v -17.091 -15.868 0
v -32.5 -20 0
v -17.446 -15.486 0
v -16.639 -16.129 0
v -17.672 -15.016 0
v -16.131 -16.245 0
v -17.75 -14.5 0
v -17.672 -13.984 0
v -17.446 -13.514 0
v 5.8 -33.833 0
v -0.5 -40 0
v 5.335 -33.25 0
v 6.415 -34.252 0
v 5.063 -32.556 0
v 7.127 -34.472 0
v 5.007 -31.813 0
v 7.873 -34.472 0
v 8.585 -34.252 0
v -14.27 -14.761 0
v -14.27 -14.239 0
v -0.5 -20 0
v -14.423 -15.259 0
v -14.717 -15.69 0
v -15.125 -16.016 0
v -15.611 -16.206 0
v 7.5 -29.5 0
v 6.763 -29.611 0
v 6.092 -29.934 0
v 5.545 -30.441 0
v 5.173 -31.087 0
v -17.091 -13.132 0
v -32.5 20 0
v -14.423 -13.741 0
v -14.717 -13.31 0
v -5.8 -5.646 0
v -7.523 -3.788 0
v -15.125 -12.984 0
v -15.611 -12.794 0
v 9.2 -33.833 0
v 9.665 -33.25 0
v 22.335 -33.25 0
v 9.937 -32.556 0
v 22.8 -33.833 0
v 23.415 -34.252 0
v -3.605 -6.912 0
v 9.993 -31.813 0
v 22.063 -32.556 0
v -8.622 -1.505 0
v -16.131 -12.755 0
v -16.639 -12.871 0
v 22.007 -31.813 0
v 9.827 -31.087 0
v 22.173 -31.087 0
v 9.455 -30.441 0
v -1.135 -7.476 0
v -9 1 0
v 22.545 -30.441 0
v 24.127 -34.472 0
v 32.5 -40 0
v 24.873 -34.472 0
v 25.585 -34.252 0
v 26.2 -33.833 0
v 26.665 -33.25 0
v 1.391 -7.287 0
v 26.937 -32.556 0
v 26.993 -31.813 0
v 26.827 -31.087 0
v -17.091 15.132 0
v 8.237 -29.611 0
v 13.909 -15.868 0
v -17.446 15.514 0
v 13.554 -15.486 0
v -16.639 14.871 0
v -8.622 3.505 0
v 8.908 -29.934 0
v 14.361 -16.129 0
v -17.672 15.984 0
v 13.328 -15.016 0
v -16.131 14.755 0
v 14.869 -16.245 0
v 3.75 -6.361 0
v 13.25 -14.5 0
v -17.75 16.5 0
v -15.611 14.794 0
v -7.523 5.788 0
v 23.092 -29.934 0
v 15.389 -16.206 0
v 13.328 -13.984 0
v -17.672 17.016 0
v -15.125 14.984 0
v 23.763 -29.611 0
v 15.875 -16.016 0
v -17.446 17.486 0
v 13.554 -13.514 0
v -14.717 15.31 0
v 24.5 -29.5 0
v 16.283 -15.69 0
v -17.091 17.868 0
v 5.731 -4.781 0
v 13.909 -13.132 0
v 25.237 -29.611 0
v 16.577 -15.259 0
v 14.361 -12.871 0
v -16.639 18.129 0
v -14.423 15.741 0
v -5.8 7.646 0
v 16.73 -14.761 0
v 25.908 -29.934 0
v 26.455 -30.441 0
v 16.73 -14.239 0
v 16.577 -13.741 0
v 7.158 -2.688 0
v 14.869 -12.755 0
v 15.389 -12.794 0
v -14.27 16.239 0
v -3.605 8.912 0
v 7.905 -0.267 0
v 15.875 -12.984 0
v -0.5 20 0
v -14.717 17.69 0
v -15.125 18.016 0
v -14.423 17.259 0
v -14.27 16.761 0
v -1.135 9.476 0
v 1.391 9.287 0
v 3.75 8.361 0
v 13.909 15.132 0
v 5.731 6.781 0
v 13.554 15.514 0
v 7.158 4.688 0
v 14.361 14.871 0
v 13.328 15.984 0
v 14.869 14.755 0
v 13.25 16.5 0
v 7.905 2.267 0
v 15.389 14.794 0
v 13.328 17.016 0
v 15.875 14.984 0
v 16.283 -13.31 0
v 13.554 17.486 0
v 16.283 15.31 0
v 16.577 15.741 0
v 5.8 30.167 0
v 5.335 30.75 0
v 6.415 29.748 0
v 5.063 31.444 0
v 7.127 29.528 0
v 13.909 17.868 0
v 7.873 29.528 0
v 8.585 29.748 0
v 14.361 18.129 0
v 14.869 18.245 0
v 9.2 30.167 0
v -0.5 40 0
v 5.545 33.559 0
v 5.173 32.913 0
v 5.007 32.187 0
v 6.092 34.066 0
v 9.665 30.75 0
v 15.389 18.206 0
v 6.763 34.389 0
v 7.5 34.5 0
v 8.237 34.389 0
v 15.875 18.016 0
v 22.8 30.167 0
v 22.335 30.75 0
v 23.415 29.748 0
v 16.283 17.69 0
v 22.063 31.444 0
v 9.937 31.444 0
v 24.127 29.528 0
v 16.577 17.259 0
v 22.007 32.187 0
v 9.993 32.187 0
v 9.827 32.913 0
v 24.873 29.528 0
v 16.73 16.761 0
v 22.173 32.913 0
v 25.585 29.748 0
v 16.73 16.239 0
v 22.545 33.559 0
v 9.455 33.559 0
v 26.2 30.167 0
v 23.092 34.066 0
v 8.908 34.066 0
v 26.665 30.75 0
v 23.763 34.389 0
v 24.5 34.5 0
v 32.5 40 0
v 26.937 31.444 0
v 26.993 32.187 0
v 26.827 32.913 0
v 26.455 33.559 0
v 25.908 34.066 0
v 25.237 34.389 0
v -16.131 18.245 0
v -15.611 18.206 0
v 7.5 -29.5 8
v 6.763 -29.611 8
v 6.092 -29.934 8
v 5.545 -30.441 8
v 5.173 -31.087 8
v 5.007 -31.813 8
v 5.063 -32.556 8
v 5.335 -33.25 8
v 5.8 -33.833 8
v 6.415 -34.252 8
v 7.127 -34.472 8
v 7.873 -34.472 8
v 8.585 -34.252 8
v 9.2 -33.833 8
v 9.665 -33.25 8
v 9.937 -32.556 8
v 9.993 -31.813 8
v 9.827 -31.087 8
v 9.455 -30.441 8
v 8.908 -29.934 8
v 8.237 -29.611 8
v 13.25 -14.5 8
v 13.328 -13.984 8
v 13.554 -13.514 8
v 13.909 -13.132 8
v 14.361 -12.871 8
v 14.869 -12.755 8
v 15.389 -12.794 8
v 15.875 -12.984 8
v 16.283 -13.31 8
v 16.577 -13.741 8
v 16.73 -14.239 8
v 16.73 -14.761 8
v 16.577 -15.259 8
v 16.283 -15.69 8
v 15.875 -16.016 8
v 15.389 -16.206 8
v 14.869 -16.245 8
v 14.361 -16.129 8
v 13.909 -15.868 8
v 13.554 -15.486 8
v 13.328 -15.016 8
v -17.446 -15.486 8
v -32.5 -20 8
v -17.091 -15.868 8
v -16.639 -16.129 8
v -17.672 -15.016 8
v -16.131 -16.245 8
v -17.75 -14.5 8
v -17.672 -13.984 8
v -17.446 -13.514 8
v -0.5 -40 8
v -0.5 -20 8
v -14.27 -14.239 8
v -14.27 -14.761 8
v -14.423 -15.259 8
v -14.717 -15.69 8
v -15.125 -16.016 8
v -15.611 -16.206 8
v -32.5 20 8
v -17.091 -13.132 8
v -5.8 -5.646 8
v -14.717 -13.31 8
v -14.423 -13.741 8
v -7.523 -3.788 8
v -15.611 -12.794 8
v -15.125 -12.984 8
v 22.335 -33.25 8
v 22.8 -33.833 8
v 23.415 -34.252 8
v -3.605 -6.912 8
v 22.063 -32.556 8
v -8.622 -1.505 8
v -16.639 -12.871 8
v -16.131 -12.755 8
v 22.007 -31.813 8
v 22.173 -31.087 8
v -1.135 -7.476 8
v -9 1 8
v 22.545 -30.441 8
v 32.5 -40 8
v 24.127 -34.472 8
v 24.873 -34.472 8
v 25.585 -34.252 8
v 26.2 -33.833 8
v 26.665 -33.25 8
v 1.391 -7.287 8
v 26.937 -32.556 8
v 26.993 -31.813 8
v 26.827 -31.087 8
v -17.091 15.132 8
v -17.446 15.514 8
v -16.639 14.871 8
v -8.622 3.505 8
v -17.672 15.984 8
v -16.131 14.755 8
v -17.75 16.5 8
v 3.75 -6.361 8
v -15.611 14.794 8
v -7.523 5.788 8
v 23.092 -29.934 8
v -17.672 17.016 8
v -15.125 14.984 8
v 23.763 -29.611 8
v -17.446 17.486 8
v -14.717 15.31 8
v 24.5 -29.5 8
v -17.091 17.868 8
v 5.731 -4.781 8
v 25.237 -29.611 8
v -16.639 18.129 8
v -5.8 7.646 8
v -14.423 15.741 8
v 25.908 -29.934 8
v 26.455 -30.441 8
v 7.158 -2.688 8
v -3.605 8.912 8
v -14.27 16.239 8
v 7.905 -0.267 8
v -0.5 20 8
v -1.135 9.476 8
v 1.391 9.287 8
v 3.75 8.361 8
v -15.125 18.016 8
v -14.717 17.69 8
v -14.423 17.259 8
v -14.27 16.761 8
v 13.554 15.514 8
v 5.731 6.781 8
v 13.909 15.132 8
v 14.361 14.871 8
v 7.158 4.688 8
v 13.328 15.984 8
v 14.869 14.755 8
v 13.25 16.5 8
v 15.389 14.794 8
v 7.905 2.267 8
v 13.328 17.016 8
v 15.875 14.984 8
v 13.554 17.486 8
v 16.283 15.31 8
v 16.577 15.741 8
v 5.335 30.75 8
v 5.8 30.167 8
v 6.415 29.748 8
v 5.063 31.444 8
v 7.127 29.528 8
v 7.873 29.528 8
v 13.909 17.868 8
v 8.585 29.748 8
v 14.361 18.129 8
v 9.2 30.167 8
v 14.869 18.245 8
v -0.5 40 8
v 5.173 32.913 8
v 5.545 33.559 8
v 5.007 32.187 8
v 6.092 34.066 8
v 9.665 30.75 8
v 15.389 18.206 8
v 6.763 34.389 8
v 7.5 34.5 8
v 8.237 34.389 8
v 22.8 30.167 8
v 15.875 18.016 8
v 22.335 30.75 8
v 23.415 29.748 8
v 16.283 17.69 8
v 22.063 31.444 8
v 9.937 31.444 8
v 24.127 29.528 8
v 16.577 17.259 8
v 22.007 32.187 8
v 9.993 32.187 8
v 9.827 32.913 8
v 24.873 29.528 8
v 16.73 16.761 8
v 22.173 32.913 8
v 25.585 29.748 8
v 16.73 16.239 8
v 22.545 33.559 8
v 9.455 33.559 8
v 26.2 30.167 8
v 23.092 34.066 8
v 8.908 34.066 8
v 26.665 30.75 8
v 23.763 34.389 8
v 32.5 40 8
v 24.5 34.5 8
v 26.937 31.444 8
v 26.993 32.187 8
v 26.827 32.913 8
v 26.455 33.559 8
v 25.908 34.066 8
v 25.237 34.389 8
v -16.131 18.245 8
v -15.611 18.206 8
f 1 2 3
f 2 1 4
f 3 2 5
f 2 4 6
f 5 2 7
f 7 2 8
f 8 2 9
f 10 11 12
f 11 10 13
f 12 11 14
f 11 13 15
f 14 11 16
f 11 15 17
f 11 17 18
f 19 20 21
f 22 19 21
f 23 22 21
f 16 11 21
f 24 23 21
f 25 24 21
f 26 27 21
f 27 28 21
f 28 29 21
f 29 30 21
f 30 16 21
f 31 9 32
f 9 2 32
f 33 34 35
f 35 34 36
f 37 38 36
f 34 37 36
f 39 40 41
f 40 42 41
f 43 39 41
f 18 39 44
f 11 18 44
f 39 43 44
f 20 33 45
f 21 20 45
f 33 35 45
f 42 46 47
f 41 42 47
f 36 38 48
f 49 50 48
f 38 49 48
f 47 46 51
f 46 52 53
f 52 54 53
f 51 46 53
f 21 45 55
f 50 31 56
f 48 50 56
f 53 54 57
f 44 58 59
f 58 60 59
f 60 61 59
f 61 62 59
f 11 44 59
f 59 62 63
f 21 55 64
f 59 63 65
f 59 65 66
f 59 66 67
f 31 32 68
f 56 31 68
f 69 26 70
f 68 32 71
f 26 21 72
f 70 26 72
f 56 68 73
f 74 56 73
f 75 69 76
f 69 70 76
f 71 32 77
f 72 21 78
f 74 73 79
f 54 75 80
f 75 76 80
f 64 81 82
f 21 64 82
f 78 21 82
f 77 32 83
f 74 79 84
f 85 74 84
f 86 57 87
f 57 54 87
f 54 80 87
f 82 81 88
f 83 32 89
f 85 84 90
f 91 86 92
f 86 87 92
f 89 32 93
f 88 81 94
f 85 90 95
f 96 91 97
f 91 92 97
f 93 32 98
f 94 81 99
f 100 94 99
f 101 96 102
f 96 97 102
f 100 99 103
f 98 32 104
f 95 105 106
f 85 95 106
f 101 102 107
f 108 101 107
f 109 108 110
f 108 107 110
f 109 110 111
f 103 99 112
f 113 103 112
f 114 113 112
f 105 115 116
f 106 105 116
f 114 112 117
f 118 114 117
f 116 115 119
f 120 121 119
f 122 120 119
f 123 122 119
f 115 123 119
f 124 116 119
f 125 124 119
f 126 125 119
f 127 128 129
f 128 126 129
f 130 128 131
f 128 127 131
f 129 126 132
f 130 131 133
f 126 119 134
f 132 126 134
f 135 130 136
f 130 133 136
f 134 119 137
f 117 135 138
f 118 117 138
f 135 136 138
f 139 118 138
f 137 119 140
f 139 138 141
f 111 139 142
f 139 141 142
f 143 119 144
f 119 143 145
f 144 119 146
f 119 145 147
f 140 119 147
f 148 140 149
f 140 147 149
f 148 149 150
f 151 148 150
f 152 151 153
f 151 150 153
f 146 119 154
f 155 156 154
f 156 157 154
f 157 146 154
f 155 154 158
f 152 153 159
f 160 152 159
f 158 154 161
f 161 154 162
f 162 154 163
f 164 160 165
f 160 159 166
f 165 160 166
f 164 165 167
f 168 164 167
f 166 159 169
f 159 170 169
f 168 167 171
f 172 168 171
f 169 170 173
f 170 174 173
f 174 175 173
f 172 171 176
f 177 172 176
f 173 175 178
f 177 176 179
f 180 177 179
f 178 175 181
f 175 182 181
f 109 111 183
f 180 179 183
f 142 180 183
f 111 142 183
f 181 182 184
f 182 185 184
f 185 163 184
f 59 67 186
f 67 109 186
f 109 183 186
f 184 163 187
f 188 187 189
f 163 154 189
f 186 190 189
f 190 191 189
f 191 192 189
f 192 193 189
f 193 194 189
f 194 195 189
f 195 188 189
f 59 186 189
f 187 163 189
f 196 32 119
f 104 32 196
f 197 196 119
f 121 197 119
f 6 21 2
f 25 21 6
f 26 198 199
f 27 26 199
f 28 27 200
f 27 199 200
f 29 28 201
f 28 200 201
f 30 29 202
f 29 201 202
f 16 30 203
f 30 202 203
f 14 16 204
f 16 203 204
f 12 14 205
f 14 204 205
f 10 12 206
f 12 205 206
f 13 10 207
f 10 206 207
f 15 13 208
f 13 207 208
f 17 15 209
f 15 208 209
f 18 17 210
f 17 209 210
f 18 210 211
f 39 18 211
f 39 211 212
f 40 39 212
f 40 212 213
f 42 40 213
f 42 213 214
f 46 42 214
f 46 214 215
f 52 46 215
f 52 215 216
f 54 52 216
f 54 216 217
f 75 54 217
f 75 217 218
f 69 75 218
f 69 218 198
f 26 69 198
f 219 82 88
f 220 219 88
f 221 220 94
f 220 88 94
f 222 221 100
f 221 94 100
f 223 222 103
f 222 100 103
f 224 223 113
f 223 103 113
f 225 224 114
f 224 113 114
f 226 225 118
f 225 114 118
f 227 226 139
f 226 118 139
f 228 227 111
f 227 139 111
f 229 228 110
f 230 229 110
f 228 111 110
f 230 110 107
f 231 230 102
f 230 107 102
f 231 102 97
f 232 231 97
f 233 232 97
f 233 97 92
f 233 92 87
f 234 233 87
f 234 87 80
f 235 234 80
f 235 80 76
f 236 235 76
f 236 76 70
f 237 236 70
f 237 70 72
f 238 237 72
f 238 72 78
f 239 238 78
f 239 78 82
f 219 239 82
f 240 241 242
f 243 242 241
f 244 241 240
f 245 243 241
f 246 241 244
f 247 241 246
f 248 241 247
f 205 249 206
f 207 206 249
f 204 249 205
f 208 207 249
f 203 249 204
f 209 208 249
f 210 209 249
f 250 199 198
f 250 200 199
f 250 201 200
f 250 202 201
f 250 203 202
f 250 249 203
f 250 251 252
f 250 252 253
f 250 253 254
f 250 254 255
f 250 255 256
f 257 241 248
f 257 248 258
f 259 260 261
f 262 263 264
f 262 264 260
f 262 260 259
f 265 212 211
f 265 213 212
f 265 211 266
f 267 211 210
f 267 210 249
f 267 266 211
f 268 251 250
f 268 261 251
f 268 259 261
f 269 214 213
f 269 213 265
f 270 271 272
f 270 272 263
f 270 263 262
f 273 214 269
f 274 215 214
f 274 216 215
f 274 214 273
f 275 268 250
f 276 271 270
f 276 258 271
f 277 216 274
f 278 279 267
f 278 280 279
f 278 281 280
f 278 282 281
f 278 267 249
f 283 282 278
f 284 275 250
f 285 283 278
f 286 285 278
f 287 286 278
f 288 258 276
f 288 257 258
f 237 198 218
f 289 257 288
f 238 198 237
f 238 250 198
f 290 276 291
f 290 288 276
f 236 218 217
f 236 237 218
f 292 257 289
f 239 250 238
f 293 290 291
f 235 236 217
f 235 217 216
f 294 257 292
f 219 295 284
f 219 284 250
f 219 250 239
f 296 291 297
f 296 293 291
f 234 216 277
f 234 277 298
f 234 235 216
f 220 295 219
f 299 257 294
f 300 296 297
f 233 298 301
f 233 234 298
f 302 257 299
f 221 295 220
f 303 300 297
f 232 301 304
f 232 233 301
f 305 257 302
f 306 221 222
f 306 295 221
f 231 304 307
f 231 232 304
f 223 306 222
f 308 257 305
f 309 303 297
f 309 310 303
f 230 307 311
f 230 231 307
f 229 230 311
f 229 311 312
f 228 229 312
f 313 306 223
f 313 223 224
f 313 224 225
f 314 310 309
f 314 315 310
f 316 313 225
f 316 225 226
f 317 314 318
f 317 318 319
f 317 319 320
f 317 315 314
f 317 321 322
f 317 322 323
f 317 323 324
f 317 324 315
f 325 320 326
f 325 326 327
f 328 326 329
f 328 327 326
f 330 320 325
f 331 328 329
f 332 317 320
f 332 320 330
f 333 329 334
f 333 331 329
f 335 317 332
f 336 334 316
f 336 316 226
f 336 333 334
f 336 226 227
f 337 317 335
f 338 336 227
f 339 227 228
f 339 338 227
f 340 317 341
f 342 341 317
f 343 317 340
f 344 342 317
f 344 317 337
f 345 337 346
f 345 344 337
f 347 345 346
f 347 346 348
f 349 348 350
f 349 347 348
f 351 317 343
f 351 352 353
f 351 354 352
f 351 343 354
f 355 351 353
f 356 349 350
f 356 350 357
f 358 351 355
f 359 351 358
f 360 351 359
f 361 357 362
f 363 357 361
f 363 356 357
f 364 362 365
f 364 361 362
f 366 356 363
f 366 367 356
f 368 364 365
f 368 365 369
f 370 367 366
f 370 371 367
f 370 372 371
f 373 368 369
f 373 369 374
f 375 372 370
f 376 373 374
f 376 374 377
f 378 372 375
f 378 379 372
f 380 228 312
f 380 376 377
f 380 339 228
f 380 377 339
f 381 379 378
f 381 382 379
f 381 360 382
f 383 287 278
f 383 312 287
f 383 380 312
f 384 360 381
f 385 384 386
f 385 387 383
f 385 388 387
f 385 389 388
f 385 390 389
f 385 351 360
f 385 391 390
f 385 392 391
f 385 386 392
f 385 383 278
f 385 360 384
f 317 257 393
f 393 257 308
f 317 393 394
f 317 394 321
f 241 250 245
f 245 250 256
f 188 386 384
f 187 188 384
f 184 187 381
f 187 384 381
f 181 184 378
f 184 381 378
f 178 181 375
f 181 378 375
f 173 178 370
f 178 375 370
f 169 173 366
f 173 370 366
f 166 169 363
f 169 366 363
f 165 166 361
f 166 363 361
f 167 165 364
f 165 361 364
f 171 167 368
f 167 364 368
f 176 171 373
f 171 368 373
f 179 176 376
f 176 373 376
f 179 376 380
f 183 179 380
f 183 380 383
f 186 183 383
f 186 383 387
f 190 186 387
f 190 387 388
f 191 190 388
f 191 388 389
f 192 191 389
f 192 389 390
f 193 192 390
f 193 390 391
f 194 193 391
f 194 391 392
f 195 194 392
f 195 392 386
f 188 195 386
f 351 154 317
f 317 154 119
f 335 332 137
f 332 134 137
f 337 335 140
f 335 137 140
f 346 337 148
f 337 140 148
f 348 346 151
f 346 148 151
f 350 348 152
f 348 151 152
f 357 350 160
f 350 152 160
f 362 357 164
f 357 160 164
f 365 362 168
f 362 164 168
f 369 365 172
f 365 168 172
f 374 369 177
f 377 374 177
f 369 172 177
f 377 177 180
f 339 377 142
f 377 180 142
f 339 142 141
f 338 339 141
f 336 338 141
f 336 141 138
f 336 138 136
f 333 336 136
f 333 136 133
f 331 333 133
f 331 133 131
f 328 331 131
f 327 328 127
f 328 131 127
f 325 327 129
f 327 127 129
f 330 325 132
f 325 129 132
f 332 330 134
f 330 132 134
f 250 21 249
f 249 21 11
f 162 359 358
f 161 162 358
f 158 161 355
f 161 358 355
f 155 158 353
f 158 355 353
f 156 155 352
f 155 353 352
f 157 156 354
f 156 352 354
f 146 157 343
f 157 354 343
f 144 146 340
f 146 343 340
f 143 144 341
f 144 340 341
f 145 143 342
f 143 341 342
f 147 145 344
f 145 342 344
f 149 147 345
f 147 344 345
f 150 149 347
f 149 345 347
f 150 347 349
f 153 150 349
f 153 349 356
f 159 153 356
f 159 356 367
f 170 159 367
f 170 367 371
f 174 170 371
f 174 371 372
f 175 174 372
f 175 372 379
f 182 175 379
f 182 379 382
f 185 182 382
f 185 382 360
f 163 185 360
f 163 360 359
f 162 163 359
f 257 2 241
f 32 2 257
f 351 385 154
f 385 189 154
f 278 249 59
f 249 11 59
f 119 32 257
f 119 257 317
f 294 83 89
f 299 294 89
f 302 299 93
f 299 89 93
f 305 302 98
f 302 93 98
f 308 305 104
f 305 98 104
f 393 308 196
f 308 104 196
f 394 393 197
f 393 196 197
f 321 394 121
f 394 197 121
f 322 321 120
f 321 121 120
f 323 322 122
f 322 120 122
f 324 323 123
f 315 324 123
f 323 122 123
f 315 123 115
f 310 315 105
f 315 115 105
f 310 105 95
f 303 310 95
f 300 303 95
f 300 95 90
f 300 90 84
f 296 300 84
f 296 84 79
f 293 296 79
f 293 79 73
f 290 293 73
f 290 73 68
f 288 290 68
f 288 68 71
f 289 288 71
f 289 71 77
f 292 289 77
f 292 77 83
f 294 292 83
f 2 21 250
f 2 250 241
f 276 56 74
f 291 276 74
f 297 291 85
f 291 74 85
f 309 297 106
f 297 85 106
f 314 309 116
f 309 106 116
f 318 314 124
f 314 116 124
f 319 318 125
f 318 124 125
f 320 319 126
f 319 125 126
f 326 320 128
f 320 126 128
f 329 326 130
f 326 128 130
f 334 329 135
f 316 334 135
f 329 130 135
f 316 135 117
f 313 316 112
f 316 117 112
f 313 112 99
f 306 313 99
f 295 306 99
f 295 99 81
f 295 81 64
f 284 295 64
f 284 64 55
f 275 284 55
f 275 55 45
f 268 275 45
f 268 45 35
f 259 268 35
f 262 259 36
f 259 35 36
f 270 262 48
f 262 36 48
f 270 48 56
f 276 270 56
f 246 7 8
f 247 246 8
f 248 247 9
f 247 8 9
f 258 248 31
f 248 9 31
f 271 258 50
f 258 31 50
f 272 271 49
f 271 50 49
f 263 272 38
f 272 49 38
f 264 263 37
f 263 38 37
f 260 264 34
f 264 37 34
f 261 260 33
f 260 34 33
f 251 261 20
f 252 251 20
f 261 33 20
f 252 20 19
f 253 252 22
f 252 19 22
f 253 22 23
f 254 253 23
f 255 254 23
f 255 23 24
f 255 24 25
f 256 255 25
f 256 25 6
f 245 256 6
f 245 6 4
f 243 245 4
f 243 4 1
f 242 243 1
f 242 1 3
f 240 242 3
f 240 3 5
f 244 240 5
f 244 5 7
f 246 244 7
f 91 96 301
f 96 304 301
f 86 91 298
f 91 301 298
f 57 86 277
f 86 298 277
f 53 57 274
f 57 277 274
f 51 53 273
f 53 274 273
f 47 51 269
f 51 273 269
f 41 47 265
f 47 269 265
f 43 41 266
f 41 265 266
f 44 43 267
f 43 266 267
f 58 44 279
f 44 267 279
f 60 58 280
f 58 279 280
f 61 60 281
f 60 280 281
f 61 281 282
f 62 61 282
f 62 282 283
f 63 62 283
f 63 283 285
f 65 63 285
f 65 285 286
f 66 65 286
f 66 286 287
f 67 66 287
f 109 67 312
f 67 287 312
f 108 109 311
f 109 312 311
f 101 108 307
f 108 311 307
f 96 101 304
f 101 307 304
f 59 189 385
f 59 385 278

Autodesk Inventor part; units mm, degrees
ref_plane "YZ Plane" through (0, 0, 0) normal (1, 0, 0) x (0, 1, 0)
ref_plane "XZ Plane" through (0, 0, 0) normal (0, 1, 0) x (-1, 0, 0)
ref_plane "XY Plane" through (0, 0, 0) normal (0, 0, 1) x (1, 0, 0)
sketch "Sketch1" plane through (0, 0, 0) normal (0, 0, 1) x (1, 0, 0)
  line L0 (-32.5, 20) -> (32.5, 20)
  line L1 (32.5, 20) -> (32.5, -20)
  line L2 (32.5, -20) -> (-32.5, -20)
  line L3 (-32.5, -20) -> (-32.5, 20)
  point P0 (0, 0)
  point P1 (0, 20)
  point P2 (-32.5, 0)
  dimension "d0" = 65
  dimension "d1" = 40
extrude "Extrusion1" add sketch "Sketch1" along normal blind 8
sketch "Sketch5" plane through (0, 0, 0) normal (0, 0, -1) x (-1, 0, 0)
  line L0 (-32.5, 40) -> (0.5, 40)
  line L1 (0.5, 40) -> (0.5, -40)
  line L2 (0.5, -40) -> (-32.5, -40)
  line L3 (-32.5, -40) -> (-32.5, 40)
  line L4 (-32.5, -20) -> (-32.5, 20) projected
  line L5 (-32.5, 20) -> (32.5, 20) projected
  line L6 (32.5, -20) -> (-32.5, -20) projected
  point P0 (0, 0)
  dimension "d22" = 20
  dimension "d23" = 20
  dimension "d24" = 33
extrude "Extrusion5" add sketch "Sketch5" against normal up to surface (8 mm away)
sketch "Sketch6" plane through (0, 0, 0) normal (0, 0, -1) x (-1, 0, 0)
  line L0 (0.5, 40) -> (-32.5, 40) projected
  line L1 (-32.5, 40) -> (-32.5, -40) projected
  line L2 (-15, 16.5) -> (16, 16.5) construction
  line L3 (16, 16.5) -> (16, -14.5) construction
  line L4 (16, -14.5) -> (-15, -14.5) construction
  line L5 (-15, -14.5) -> (-15, 16.5) construction
  line L6 (-15, 16.5) -> (16, -14.5) construction
  line L7 (16, 16.5) -> (-15, -14.5) construction
  circle A0 centre (-15, 16.5) radius 1.75
  circle A1 centre (16, 16.5) radius 1.75
  circle A2 centre (16, -14.5) radius 1.75
  circle A3 centre (-15, -14.5) radius 1.75
  circle A4 centre (0.5, 1) radius 8.5
  dimension "d29" = 31
  dimension "d30" = 33
  dimension "d31" = 39
  dimension "d32" = 3.5
  dimension "d33" = 17
extrude "Extrusion6" cut sketch "Sketch6" against normal blind 10
sketch "Sketch7" plane through (0, 0, 0) normal (0, 0, -1) x (-1, 0, 0)
  line L0 (-32.5, 40) -> (-32.5, -40) projected
  line L1 (0.5, 40) -> (-32.5, 40) projected
  line L2 (0.5, 20) -> (0.5, 40) projected
  line L3 (-32.5, -40) -> (0.5, -40) projected
  point P0 (0, 0)
  point P1 (-24.5, 32)
  point P2 (-7.5, 32)
  point P3 (-24.5, -32)
  point P4 (-7.5, -32)
  dimension "d36" = 8
  dimension "d37" = 8
  dimension "d38" = 8
  dimension "d39" = 17
  dimension "d40" = 8
  dimension "d41" = 64
hole "Hole1" at (24.5, 32, 0) direction (0, 0, 1) diameter 5 end through all
pattern_linear "Rectangular Pattern1" count 2 spacing 64 along (0, -1, 0) count 2 spacing 17 along (-1, 0, 0) of "Hole1"
equation "\"d23\" = d22"
equation "\"d38\" = d36"
equation "\"d40\" = d37"
properties part number "0005-10-023 Suport motor x" material "Wood (Maple)"
